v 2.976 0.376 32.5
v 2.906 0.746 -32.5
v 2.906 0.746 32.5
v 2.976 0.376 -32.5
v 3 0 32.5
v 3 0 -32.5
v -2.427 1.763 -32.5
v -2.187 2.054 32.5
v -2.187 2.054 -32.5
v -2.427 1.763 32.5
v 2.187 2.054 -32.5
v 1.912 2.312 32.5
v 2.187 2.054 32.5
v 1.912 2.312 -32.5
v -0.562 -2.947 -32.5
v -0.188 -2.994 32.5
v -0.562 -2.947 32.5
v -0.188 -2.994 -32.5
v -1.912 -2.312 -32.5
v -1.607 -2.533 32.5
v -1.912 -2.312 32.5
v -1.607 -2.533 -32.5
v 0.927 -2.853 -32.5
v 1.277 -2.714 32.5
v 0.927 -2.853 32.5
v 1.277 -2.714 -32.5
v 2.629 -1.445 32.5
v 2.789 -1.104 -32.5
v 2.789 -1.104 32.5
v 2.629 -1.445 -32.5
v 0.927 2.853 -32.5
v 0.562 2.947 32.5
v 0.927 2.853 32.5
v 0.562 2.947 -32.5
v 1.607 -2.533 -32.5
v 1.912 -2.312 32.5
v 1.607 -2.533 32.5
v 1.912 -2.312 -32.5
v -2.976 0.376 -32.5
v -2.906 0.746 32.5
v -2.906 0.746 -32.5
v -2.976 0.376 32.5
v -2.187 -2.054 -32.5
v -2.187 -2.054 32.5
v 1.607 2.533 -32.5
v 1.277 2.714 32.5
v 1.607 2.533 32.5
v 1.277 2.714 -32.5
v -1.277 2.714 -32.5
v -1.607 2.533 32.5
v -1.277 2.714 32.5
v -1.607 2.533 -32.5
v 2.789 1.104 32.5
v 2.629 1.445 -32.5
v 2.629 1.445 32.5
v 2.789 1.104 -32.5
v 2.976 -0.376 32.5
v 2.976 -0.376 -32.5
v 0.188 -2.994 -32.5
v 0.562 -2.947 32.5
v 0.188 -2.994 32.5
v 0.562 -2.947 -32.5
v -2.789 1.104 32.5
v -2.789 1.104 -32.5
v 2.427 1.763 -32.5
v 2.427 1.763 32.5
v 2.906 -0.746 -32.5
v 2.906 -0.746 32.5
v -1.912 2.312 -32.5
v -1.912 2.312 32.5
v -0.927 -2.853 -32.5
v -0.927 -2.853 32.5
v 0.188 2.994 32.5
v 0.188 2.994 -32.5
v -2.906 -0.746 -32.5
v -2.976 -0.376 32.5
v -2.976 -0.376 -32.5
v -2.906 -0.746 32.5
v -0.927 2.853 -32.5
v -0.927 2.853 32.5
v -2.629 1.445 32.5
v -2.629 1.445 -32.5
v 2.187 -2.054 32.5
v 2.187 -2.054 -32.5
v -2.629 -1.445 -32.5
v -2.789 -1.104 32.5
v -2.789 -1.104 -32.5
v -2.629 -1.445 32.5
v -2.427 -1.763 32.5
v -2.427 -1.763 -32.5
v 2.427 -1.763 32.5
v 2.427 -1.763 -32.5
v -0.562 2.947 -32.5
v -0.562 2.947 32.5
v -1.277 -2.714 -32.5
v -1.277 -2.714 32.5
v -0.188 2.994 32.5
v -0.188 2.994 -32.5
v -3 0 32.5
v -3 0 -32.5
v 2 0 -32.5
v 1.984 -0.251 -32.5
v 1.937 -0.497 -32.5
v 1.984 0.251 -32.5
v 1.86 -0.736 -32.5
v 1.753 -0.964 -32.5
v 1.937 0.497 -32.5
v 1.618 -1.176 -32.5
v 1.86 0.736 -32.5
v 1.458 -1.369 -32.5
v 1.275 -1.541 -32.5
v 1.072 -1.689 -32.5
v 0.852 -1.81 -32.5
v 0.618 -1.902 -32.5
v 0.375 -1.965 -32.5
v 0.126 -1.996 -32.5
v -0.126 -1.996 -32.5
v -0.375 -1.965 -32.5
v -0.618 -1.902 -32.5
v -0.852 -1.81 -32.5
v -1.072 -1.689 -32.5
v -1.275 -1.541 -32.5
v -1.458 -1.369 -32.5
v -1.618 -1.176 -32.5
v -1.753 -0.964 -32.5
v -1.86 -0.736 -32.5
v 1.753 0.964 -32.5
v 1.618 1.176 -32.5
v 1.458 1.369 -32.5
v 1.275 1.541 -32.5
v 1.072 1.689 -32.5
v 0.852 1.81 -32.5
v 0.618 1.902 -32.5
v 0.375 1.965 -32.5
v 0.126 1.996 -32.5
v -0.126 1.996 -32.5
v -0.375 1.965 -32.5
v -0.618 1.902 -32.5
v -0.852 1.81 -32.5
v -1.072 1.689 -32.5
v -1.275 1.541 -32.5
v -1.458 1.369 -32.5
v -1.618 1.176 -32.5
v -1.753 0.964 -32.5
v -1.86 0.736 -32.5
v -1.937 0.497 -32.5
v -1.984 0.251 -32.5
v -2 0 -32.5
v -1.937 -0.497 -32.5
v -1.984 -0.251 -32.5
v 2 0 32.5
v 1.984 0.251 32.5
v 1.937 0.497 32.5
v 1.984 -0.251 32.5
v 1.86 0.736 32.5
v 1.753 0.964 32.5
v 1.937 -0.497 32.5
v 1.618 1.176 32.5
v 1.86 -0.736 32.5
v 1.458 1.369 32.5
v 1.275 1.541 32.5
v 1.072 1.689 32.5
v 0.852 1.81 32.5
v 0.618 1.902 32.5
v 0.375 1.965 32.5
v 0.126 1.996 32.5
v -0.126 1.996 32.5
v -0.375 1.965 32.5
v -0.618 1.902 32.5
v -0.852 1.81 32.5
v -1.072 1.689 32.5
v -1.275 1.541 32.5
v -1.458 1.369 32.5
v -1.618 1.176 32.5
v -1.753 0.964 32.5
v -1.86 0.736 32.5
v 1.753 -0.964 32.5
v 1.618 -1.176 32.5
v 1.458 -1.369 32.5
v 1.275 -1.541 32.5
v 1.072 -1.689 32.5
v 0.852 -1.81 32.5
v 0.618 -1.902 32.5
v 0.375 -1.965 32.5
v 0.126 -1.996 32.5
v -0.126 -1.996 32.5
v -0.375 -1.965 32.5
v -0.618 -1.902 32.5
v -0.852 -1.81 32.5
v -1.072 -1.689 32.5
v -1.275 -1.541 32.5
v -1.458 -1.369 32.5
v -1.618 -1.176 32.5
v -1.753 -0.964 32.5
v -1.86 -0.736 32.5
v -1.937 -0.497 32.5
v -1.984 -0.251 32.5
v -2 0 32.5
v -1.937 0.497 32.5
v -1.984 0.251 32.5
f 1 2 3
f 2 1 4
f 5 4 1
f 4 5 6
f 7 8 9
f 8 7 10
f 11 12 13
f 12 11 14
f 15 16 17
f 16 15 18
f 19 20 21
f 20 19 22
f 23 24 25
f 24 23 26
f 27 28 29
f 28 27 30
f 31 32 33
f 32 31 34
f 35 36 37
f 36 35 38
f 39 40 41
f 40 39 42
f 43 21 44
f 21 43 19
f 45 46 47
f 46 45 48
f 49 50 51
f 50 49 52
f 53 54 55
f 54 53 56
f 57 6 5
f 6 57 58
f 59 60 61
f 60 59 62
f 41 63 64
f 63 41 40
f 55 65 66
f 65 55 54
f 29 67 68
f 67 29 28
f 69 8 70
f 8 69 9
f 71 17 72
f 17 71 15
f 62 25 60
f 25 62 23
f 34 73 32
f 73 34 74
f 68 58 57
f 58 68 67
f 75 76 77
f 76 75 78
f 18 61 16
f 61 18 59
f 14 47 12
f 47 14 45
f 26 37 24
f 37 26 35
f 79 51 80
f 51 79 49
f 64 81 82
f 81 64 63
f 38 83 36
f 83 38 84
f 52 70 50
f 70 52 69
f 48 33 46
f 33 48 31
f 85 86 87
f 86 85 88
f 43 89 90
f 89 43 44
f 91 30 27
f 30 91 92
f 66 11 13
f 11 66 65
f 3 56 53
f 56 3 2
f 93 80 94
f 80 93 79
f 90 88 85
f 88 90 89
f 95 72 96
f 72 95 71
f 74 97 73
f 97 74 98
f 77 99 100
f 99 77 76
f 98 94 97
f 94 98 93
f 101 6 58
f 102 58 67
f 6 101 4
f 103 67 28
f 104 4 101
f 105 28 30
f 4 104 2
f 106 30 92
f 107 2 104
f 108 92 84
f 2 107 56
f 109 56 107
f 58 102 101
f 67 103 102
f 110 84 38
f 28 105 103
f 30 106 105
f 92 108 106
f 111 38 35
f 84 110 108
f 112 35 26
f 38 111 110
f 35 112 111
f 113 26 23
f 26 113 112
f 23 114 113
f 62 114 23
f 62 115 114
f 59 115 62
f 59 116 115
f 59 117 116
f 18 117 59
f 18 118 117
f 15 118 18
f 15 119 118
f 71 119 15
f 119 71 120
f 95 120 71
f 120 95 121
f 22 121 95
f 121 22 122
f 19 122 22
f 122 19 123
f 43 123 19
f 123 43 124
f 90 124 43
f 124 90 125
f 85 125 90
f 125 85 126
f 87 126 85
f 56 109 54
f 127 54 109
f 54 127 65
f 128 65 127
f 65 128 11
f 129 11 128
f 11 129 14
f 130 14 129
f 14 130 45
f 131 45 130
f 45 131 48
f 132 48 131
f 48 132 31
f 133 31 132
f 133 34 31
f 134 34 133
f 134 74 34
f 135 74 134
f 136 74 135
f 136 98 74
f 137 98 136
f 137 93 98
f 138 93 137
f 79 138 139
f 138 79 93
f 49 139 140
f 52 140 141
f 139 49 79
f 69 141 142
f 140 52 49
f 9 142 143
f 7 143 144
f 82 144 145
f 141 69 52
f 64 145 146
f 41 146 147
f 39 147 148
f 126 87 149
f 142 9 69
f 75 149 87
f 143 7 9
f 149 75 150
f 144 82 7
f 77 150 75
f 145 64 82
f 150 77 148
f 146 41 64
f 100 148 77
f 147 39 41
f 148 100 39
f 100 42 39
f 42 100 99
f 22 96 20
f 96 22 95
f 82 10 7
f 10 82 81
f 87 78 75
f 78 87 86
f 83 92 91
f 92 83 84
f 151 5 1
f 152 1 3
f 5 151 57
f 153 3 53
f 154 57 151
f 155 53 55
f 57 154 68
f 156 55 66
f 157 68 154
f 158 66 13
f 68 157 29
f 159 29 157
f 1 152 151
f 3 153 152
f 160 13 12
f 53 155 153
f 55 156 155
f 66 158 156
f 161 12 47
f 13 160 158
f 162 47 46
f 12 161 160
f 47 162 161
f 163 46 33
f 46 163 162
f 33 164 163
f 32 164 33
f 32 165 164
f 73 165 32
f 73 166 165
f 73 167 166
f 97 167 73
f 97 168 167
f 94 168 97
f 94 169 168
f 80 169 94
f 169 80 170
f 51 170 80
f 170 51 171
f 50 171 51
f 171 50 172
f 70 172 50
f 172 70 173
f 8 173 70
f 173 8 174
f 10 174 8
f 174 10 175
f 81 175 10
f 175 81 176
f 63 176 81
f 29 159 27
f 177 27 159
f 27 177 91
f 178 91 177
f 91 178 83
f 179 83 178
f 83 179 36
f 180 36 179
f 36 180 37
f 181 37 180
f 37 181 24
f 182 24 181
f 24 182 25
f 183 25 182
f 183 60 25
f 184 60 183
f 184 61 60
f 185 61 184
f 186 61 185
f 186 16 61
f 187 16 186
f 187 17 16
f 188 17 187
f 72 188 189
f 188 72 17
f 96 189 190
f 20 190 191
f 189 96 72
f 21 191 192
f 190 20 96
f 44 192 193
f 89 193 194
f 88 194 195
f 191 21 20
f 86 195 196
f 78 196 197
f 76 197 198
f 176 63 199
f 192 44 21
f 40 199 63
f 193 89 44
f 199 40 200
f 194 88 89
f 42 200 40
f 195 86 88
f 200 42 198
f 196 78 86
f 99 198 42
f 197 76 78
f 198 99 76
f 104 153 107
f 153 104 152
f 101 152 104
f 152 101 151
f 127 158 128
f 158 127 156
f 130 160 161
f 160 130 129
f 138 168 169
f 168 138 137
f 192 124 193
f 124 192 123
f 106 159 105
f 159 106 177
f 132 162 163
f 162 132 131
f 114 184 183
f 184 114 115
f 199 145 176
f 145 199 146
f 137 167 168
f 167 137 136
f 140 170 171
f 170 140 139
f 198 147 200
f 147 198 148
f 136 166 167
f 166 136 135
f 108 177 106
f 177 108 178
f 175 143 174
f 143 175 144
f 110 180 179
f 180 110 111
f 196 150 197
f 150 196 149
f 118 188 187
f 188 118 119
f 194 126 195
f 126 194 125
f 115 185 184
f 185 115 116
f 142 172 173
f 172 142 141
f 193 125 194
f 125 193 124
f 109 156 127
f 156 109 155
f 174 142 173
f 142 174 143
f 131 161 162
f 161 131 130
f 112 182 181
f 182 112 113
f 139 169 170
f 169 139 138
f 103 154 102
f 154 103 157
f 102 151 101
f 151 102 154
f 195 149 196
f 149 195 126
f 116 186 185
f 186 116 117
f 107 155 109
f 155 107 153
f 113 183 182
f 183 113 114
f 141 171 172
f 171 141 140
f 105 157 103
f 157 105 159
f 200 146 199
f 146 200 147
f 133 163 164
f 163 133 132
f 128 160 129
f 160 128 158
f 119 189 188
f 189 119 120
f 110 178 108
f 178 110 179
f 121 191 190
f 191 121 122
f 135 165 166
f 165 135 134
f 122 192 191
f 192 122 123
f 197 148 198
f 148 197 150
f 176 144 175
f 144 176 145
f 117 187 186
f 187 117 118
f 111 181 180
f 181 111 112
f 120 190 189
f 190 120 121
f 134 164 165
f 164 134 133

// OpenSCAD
$fn = 50;


difference() {
	union() {
		translate(v = [0, 0, -32.5000000000]) {
			cylinder(h = 65, r = 3.0000000000);
		}
	}
	union() {
		translate(v = [0, 0, -100.0000000000]) {
			cylinder(h = 200, r = 2.0000000000);
		}
	}
}
